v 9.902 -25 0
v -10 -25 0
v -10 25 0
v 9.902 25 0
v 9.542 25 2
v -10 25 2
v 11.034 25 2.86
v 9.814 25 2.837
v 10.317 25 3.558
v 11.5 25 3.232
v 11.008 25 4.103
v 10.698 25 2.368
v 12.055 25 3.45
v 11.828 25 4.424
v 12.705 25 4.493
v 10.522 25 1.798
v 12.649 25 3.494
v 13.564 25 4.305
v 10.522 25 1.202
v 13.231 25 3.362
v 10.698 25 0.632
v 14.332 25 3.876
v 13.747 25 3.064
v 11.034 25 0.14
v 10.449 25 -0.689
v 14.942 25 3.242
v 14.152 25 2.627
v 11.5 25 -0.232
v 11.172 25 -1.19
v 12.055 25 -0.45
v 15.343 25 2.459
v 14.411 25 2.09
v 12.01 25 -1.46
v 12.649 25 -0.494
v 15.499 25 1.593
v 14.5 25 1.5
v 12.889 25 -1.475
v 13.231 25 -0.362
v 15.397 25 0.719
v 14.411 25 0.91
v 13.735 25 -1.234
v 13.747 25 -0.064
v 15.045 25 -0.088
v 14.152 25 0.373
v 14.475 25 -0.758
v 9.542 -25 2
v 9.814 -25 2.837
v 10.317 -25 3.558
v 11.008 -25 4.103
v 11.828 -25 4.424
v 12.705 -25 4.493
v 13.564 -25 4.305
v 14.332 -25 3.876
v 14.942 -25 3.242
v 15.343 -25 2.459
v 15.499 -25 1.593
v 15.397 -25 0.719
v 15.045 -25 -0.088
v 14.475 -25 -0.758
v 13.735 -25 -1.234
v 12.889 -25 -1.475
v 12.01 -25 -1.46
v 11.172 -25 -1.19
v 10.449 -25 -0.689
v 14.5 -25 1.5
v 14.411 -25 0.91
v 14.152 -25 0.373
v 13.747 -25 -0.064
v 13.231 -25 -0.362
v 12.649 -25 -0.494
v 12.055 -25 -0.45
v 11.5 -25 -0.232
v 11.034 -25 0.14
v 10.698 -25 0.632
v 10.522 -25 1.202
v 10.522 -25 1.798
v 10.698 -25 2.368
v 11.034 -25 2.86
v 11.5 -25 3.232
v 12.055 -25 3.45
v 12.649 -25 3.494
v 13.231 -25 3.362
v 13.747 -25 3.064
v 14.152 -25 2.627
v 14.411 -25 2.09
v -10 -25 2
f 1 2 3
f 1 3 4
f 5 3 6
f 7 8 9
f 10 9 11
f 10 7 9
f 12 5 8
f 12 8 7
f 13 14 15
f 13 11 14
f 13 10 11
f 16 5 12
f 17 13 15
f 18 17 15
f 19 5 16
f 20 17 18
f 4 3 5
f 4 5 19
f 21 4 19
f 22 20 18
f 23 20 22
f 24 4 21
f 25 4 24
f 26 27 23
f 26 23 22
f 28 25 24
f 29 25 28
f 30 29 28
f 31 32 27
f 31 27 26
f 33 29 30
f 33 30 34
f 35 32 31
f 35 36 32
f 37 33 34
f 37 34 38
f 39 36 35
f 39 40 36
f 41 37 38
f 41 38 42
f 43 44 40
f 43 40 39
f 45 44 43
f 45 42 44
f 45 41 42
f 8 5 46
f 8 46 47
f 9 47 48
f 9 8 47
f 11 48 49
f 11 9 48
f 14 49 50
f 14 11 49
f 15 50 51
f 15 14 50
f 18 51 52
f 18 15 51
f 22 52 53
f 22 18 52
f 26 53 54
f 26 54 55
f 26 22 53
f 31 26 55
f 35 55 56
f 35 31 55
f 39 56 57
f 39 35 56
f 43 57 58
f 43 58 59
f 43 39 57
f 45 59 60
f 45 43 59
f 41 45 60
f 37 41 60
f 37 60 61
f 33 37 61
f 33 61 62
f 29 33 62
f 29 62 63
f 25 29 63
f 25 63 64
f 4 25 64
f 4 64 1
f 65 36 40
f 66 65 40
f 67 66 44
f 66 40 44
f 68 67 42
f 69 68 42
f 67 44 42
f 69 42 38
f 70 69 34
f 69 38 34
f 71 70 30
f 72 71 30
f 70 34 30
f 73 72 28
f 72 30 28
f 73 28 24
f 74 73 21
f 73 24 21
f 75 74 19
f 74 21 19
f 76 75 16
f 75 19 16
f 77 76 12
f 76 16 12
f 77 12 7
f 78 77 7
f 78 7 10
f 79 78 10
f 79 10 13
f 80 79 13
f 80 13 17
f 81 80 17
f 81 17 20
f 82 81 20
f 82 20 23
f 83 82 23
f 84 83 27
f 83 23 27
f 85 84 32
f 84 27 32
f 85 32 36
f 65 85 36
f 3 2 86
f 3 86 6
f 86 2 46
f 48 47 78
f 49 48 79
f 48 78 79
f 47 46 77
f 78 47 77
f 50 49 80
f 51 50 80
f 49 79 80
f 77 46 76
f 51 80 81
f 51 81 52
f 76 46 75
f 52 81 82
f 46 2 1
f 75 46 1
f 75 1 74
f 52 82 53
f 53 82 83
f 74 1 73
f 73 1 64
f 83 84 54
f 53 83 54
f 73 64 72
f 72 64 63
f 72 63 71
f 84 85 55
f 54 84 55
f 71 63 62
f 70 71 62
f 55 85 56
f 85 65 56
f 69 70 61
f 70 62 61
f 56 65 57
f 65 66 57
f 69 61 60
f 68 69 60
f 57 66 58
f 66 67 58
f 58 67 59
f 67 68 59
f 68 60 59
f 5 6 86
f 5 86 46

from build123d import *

# Parameters (mm, degrees)
SKETCH3_W           = 20
SKETCH3_H           = 50
BOSS_EXTRUDE2_DEPTH = 2
SKETCH4_R           = 3
SKETCH4_R_2         = 2
BOSS_EXTRUDE3_DEPTH = 50


with BuildPart() as part:
    # Sketch3 → Boss-Extrude2 (new body)
    with BuildSketch(Plane.XY):
        Rectangle(SKETCH3_W, SKETCH3_H)
    extrude(amount=BOSS_EXTRUDE2_DEPTH)

    # Sketch4 → Boss-Extrude3 (add)
    with BuildSketch(Plane(origin=(0, 25, 0), x_dir=(1, 0, 0), z_dir=(0, 1, 0))):
        with Locations((12.5, -1.5)):
            Circle(SKETCH4_R)
        with Locations((12.5, -1.5)):
            Circle(SKETCH4_R_2, mode=Mode.SUBTRACT)
    extrude(amount=-BOSS_EXTRUDE3_DEPTH)


solid = part.part
